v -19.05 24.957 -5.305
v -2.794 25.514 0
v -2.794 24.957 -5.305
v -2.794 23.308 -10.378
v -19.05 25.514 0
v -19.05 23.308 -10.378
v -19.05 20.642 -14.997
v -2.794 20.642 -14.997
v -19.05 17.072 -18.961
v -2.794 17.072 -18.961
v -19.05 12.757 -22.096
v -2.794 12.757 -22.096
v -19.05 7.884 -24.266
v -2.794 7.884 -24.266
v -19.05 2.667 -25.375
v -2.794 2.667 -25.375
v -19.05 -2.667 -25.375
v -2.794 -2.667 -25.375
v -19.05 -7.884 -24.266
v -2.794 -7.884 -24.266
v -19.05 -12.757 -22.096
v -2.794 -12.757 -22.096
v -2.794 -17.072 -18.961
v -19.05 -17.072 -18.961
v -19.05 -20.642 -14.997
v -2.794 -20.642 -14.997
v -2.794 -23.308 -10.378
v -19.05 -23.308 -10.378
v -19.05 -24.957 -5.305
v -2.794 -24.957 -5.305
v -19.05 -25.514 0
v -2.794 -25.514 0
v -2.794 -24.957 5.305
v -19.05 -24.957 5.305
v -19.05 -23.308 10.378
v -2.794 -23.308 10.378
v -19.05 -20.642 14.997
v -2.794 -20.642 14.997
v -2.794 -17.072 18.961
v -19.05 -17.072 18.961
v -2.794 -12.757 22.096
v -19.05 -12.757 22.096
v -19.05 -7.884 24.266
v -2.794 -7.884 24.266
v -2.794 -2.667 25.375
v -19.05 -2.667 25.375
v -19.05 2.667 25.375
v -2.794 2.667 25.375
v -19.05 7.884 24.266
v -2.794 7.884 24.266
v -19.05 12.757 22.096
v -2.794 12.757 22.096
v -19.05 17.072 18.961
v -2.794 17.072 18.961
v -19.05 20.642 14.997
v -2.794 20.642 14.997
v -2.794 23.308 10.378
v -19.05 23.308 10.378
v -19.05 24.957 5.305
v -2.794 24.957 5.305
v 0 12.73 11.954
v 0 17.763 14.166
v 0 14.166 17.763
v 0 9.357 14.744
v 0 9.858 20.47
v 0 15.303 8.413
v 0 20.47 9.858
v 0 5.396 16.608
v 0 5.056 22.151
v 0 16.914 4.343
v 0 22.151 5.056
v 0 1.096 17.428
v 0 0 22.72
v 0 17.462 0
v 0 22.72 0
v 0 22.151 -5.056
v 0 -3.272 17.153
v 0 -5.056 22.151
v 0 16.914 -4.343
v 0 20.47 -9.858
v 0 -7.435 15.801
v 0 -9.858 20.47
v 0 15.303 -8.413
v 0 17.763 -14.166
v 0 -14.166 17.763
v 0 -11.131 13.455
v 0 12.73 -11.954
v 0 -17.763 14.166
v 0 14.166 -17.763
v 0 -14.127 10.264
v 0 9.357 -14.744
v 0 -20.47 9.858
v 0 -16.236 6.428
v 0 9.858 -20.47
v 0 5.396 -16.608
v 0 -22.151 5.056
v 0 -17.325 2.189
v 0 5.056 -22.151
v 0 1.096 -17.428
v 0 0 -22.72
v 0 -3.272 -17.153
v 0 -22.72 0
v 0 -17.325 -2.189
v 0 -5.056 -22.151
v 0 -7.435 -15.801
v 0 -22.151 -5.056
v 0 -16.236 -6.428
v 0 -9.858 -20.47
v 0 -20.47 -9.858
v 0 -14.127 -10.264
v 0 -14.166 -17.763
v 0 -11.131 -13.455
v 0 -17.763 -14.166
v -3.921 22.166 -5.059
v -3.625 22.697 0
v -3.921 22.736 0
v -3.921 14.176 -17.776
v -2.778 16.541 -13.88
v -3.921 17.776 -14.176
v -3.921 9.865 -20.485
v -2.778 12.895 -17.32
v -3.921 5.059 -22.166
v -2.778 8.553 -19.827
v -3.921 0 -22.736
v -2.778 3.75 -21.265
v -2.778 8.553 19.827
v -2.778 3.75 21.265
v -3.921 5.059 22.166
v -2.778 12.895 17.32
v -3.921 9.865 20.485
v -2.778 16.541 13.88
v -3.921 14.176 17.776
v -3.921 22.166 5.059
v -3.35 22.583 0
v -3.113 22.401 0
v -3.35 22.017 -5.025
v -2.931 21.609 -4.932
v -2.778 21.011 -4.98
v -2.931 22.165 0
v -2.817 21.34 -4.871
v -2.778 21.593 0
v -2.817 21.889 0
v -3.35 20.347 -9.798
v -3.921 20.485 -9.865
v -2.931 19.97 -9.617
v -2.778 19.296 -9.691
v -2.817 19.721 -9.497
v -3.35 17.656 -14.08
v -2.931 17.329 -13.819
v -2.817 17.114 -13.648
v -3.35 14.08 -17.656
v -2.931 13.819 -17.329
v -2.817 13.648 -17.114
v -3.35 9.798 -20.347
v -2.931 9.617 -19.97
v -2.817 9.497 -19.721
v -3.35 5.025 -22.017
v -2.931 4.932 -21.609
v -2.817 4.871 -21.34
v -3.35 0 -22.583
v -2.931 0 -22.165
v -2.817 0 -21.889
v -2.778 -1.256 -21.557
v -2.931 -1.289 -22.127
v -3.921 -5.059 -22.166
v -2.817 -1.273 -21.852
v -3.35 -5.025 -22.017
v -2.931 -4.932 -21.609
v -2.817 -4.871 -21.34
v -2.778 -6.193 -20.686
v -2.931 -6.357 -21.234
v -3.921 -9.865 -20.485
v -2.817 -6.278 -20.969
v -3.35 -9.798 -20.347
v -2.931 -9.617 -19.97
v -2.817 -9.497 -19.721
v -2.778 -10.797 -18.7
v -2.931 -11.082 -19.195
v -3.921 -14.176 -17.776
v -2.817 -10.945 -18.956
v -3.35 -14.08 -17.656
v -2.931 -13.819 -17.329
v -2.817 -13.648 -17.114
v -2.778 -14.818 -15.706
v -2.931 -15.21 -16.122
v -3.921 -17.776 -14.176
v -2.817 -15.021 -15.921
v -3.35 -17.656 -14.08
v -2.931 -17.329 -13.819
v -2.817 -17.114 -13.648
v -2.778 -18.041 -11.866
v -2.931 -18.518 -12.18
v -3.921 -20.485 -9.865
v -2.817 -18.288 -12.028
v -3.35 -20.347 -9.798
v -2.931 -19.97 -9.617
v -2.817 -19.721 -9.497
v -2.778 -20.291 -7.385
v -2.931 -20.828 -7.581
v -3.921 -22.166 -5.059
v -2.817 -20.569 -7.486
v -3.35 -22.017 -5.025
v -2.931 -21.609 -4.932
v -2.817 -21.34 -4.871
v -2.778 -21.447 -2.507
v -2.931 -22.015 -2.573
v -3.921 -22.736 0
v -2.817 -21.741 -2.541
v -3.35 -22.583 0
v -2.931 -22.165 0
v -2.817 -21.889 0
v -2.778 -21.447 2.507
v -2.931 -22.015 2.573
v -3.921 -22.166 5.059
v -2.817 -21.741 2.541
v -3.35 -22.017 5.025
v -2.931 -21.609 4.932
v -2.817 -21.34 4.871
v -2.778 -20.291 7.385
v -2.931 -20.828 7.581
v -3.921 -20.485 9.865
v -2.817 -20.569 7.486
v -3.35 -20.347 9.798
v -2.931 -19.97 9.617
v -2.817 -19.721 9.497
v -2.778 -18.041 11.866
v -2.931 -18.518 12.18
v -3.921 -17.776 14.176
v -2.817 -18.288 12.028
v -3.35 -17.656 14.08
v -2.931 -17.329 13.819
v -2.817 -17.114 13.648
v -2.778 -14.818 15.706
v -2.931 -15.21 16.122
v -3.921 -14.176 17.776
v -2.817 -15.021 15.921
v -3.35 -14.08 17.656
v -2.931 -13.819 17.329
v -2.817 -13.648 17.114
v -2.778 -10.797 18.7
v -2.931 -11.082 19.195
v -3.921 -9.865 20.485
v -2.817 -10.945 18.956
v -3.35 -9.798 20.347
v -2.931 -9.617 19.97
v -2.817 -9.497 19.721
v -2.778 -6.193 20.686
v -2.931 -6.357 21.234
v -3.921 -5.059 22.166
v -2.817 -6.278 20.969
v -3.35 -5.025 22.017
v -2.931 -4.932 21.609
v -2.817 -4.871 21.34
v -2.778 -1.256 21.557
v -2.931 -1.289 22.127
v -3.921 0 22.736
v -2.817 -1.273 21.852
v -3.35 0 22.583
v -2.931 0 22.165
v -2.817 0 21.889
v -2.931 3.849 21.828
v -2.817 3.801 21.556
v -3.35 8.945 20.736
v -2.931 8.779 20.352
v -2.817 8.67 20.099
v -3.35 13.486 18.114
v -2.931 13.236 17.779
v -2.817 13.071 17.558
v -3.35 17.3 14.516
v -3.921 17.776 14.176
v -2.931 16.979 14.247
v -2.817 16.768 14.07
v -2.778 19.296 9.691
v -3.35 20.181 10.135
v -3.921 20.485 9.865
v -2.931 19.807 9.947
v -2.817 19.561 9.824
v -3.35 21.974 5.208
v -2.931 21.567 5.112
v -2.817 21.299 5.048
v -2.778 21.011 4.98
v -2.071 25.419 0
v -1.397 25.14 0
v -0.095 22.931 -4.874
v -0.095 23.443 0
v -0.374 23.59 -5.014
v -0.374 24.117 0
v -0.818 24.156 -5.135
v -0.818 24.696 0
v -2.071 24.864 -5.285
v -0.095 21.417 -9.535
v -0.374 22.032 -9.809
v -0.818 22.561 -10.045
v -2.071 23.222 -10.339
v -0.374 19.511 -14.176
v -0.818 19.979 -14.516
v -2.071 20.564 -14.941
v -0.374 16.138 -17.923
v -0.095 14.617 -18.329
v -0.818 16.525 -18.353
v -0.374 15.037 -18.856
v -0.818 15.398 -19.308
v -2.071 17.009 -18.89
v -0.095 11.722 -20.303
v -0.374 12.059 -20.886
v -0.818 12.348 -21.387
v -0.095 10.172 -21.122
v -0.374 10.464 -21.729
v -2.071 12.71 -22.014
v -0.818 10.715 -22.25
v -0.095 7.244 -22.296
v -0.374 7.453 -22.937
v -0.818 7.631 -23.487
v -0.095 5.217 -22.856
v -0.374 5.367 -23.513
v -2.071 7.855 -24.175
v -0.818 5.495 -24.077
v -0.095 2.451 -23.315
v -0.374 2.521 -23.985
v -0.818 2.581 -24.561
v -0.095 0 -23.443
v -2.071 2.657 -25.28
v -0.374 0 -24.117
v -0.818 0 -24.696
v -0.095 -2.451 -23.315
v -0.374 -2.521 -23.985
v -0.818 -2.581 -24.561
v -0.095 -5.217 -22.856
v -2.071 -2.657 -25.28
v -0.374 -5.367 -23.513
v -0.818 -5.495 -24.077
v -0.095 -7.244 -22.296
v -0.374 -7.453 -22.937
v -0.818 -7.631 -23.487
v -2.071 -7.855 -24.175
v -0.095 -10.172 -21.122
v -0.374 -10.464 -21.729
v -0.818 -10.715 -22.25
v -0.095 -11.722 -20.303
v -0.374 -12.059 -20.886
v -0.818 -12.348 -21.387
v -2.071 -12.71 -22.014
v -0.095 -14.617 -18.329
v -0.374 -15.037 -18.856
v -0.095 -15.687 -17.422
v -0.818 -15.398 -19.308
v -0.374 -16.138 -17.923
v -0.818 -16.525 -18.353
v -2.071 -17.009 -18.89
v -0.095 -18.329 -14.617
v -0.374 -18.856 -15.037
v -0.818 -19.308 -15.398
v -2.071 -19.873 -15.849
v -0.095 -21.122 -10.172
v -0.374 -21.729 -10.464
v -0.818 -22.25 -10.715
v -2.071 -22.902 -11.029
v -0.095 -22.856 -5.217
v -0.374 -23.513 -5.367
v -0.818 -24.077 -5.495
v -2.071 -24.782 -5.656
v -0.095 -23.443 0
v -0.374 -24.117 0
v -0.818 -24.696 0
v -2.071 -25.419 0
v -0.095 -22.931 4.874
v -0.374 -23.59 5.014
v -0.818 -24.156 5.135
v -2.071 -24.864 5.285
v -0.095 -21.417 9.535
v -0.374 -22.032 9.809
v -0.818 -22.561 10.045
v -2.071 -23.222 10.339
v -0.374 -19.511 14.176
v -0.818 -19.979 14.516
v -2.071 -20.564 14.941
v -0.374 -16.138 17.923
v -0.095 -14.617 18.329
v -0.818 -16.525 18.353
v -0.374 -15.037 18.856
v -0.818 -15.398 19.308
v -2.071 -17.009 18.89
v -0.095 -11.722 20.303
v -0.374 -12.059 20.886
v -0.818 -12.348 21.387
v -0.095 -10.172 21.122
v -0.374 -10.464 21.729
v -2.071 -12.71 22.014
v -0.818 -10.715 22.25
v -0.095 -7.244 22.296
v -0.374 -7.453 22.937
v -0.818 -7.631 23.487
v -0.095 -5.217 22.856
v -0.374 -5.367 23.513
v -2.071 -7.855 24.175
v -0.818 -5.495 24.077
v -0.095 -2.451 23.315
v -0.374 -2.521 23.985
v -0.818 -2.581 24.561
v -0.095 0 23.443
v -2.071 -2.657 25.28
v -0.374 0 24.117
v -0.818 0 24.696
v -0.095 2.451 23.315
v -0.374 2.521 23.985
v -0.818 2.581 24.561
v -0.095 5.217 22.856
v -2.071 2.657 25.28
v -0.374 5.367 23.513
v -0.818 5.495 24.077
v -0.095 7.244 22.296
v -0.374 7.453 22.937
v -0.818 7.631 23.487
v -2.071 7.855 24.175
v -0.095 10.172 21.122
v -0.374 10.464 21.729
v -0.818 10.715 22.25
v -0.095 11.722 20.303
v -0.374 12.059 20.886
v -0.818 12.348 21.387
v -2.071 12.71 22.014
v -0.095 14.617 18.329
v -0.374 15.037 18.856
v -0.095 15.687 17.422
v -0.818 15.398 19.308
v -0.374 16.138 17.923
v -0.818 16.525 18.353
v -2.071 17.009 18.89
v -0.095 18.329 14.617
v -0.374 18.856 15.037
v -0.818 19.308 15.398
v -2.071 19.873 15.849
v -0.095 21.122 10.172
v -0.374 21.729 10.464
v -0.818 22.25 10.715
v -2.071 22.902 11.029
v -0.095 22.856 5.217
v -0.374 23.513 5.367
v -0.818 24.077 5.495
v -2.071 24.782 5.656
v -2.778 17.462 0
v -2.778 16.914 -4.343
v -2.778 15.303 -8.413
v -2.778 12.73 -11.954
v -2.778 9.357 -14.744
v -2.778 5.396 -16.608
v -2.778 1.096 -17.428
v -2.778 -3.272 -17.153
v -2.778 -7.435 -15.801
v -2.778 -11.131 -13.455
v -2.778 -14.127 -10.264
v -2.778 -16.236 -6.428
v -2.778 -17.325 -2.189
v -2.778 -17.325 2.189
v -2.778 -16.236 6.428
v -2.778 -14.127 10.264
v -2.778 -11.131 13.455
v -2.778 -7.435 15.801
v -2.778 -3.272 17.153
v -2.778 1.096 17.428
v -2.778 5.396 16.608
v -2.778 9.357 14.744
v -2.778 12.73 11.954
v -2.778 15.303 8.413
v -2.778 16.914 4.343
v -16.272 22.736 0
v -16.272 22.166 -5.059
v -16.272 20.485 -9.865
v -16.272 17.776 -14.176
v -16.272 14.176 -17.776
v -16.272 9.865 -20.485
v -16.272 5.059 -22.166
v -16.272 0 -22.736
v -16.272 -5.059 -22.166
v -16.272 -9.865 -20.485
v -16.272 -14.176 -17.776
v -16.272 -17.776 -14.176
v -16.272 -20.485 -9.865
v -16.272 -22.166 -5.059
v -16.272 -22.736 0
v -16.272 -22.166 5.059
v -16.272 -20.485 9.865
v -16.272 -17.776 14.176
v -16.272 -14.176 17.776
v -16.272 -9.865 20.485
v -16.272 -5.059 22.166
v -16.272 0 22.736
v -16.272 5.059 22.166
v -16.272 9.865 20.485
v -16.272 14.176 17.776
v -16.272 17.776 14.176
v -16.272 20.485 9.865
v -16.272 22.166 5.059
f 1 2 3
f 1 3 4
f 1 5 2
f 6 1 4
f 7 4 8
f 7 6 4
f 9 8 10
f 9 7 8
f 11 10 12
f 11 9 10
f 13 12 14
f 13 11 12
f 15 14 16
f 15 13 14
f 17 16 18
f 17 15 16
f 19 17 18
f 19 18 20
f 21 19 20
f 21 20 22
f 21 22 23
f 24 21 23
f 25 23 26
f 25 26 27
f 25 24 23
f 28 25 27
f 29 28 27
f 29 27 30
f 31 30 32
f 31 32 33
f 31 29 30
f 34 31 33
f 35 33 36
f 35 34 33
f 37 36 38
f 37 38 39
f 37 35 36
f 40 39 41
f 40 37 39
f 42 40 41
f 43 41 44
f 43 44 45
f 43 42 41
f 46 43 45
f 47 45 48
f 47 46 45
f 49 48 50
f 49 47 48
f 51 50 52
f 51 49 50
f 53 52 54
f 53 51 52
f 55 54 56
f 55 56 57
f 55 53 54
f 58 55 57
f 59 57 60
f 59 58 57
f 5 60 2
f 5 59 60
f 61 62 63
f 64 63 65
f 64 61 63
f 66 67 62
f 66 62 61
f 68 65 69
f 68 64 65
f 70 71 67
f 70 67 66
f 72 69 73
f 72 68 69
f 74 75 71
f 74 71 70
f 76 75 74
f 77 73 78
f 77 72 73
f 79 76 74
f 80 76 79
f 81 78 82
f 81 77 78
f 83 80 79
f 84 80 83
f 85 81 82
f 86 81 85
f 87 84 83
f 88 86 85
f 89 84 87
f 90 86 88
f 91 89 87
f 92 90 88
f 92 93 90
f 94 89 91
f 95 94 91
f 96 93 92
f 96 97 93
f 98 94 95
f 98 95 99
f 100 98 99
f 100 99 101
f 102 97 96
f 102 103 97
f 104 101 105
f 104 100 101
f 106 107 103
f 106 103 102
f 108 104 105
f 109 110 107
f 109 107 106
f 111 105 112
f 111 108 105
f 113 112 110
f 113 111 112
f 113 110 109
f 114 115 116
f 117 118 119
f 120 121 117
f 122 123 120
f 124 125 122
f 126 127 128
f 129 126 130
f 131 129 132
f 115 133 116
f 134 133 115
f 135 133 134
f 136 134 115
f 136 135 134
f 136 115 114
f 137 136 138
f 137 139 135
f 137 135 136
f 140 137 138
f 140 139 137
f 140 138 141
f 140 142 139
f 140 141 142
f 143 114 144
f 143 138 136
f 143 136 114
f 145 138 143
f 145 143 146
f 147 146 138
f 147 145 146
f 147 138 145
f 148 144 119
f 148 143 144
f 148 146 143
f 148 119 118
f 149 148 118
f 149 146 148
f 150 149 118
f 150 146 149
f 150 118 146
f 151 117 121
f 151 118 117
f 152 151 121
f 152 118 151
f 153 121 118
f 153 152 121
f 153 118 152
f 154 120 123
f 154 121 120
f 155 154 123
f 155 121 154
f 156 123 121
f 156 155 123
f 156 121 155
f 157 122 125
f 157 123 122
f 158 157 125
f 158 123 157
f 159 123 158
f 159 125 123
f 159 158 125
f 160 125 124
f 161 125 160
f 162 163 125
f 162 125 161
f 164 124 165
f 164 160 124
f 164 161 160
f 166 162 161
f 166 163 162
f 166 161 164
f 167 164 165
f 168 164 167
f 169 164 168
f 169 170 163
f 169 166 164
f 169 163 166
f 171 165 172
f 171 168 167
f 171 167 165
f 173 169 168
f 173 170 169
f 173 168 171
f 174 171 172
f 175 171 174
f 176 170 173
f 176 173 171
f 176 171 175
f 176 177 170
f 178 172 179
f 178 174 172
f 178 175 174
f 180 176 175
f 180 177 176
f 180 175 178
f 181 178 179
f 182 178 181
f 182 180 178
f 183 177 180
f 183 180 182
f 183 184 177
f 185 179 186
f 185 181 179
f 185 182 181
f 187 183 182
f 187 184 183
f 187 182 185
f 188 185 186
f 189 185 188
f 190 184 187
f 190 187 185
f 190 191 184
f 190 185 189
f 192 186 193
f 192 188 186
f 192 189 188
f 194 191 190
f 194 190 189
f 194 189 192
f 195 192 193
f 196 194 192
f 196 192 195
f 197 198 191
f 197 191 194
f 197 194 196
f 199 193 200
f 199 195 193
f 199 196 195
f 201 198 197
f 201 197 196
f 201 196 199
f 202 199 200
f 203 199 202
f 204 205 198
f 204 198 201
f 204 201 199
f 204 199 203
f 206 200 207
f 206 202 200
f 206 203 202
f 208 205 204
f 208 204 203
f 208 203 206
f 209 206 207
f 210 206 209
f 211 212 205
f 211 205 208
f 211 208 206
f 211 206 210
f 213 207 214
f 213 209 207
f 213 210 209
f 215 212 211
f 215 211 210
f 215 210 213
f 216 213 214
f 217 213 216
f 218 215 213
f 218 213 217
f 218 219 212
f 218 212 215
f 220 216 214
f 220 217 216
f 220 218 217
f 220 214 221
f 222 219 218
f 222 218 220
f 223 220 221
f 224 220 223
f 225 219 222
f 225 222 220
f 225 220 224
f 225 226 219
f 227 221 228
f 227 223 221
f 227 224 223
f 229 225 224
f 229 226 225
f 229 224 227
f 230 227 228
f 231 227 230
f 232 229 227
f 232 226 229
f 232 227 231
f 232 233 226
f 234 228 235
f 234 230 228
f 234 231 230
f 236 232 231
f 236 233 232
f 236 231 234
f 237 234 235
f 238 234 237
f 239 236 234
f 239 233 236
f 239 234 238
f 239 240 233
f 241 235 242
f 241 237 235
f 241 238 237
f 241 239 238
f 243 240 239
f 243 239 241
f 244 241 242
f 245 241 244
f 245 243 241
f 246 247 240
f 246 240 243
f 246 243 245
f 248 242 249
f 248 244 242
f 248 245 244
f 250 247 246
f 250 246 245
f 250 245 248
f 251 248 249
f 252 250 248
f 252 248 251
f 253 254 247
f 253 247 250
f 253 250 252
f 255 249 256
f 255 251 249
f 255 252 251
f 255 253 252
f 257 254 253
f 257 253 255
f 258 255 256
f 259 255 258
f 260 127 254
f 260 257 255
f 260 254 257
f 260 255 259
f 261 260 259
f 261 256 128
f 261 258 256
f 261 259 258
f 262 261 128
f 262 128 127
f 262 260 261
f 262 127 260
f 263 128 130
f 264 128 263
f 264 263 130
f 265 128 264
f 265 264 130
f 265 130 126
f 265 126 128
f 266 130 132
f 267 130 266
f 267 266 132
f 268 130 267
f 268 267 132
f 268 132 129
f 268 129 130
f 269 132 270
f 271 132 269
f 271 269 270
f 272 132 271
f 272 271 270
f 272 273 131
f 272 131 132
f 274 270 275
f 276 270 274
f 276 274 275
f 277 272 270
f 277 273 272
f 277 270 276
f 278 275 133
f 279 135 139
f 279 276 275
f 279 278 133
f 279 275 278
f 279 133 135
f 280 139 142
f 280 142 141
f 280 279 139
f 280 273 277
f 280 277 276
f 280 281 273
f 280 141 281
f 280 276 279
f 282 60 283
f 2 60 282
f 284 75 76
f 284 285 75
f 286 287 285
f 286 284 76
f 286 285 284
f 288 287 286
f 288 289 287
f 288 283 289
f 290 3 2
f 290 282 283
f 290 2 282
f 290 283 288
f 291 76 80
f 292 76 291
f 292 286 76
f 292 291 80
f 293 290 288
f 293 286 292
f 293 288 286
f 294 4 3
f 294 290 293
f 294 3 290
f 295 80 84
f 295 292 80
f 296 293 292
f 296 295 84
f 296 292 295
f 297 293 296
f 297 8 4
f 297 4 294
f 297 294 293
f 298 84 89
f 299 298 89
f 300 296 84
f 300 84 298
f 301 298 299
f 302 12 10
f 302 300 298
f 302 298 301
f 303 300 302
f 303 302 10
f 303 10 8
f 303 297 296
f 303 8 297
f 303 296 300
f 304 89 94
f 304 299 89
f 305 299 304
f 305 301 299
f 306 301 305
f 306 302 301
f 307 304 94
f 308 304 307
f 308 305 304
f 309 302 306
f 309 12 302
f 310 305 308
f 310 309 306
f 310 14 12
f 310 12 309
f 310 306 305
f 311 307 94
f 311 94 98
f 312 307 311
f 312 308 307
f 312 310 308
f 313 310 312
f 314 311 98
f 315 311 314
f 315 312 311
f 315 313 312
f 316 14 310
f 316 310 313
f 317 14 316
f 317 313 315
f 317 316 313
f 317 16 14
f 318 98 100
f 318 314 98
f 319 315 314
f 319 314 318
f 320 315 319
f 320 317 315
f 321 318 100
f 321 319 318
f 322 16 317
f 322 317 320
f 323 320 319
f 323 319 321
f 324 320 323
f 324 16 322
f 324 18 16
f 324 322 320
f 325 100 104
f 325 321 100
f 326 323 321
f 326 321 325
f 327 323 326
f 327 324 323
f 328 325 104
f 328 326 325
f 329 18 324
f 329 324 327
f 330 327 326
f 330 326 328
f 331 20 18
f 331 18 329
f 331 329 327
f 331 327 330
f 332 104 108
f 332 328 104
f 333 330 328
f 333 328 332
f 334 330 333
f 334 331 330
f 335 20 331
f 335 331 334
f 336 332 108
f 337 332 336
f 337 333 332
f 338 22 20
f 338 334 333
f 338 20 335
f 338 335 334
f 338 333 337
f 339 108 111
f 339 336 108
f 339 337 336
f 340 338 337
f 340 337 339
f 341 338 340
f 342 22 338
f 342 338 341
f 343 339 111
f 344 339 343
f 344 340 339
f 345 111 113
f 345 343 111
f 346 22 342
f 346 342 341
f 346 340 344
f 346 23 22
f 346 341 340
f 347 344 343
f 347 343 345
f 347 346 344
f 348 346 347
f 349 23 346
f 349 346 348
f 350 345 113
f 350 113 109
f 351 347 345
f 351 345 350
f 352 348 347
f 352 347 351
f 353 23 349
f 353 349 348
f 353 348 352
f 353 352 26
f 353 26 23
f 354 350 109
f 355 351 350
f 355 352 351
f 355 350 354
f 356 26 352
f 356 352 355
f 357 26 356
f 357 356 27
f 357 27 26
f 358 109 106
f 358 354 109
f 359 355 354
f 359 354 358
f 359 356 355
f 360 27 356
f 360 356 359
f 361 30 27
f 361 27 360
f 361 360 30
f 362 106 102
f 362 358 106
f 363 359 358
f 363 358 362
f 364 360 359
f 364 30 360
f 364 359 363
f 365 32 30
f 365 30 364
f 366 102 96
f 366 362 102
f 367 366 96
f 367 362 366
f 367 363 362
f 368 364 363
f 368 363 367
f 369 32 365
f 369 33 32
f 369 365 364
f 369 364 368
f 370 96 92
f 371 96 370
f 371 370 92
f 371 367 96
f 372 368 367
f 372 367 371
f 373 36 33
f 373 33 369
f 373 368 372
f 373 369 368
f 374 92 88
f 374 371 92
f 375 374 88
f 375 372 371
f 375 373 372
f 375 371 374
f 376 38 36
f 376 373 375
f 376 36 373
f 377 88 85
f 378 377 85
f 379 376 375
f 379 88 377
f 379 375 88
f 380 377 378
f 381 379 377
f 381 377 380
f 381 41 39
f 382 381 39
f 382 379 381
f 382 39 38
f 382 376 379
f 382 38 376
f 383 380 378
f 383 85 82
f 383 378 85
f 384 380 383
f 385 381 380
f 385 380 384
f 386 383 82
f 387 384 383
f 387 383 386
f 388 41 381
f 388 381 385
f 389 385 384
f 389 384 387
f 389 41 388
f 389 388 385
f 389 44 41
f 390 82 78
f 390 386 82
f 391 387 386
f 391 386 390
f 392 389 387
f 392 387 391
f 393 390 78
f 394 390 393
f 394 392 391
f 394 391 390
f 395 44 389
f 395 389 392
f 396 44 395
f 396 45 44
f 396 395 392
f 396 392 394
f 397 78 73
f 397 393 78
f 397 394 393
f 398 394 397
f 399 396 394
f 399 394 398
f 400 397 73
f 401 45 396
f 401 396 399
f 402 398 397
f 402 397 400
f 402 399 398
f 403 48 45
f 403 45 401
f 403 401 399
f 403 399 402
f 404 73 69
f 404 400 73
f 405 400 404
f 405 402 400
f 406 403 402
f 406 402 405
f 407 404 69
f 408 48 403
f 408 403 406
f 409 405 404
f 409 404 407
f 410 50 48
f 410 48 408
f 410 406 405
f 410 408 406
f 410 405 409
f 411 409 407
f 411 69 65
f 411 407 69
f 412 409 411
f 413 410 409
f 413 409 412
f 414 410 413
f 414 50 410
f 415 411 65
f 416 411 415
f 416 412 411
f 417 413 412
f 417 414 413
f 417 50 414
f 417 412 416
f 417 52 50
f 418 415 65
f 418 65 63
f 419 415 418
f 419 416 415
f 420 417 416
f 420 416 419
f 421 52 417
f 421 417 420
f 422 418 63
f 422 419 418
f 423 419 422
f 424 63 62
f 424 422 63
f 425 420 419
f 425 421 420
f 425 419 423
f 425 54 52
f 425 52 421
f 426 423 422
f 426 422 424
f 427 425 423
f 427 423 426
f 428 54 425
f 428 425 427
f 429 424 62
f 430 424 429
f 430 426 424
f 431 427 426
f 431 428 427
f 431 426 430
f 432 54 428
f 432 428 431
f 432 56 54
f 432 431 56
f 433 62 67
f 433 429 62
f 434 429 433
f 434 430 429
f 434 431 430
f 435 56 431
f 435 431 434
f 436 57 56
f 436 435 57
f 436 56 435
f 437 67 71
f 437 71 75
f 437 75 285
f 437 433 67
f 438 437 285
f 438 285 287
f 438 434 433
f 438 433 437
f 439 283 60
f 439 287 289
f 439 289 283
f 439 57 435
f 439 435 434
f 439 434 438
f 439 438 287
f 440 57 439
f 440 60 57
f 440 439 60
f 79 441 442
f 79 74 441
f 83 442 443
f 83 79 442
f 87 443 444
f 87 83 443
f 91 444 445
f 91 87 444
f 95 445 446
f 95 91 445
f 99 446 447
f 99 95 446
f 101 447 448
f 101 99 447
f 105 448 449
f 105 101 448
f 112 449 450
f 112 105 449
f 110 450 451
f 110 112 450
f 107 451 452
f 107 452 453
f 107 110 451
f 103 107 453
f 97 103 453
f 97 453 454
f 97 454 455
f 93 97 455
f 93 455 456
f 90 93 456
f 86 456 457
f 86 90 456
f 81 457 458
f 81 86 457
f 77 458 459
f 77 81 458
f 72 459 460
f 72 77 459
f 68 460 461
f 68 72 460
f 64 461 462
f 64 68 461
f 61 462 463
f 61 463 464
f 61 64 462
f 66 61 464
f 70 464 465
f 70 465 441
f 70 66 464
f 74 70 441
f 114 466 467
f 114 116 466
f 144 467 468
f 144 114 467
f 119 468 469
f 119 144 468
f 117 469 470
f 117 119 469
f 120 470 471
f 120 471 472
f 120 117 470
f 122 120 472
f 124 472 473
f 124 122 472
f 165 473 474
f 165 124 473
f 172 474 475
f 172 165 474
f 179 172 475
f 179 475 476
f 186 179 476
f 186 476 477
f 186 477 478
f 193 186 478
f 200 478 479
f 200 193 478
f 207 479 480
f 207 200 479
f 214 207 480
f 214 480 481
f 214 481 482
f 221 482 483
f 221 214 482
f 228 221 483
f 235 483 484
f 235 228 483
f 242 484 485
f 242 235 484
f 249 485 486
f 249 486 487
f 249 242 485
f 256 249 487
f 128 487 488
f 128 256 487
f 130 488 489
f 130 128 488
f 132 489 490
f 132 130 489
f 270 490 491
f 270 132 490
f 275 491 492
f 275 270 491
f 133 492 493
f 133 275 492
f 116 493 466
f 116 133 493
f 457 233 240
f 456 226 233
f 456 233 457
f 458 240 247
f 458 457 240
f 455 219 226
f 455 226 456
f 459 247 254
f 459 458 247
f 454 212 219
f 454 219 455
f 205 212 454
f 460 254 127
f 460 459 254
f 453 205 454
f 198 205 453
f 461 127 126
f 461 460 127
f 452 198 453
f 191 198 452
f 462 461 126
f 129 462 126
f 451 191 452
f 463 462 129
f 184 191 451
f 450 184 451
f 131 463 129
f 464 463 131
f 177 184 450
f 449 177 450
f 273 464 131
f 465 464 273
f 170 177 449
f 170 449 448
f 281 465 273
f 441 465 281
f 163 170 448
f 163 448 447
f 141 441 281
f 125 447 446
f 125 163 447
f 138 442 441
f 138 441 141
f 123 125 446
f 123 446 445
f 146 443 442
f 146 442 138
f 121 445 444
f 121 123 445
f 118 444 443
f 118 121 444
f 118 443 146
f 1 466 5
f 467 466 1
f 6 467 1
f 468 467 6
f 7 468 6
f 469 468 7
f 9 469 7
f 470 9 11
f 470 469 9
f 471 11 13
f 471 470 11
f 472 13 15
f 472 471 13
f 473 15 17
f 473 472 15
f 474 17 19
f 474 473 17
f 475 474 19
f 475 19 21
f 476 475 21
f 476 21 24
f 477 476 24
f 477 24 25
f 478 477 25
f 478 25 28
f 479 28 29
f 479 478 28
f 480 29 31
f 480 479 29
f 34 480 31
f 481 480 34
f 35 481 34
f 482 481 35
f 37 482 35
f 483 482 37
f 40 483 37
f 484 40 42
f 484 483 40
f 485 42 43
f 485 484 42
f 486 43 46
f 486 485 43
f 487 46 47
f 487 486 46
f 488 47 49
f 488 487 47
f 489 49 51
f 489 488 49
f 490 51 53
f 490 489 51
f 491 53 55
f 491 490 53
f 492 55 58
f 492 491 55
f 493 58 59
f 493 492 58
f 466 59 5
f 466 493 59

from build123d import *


with BuildPart() as f1:
    # F0 (on Top) → F1 (revolve)
    with BuildSketch(Plane.XY):
        with BuildLine():
            ThreePointArc((0, 22.7203), (-0.818344, 24.695956), (-2.794, 25.5143))
            Line((-2.794, 25.5143), (-19.05, 25.5143))
            Line((-19.05, 25.5143), (-16.271875, 22.736175))
            Line((-16.271875, 22.736175), (-3.921125, 22.736175))
            ThreePointArc((-3.921125, 22.736175), (-3.112902, 22.401398), (-2.778125, 21.593175))
            Line((-2.778125, 21.593175), (-2.778125, 17.4625))
            Line((-2.778125, 17.4625), (0, 17.4625))
            Line((0, 17.4625), (0, 22.7203))
        make_face()
    revolve(axis=Axis((-9.525, 0, 0), (-1, 0, 0)))


solid = f1.part
